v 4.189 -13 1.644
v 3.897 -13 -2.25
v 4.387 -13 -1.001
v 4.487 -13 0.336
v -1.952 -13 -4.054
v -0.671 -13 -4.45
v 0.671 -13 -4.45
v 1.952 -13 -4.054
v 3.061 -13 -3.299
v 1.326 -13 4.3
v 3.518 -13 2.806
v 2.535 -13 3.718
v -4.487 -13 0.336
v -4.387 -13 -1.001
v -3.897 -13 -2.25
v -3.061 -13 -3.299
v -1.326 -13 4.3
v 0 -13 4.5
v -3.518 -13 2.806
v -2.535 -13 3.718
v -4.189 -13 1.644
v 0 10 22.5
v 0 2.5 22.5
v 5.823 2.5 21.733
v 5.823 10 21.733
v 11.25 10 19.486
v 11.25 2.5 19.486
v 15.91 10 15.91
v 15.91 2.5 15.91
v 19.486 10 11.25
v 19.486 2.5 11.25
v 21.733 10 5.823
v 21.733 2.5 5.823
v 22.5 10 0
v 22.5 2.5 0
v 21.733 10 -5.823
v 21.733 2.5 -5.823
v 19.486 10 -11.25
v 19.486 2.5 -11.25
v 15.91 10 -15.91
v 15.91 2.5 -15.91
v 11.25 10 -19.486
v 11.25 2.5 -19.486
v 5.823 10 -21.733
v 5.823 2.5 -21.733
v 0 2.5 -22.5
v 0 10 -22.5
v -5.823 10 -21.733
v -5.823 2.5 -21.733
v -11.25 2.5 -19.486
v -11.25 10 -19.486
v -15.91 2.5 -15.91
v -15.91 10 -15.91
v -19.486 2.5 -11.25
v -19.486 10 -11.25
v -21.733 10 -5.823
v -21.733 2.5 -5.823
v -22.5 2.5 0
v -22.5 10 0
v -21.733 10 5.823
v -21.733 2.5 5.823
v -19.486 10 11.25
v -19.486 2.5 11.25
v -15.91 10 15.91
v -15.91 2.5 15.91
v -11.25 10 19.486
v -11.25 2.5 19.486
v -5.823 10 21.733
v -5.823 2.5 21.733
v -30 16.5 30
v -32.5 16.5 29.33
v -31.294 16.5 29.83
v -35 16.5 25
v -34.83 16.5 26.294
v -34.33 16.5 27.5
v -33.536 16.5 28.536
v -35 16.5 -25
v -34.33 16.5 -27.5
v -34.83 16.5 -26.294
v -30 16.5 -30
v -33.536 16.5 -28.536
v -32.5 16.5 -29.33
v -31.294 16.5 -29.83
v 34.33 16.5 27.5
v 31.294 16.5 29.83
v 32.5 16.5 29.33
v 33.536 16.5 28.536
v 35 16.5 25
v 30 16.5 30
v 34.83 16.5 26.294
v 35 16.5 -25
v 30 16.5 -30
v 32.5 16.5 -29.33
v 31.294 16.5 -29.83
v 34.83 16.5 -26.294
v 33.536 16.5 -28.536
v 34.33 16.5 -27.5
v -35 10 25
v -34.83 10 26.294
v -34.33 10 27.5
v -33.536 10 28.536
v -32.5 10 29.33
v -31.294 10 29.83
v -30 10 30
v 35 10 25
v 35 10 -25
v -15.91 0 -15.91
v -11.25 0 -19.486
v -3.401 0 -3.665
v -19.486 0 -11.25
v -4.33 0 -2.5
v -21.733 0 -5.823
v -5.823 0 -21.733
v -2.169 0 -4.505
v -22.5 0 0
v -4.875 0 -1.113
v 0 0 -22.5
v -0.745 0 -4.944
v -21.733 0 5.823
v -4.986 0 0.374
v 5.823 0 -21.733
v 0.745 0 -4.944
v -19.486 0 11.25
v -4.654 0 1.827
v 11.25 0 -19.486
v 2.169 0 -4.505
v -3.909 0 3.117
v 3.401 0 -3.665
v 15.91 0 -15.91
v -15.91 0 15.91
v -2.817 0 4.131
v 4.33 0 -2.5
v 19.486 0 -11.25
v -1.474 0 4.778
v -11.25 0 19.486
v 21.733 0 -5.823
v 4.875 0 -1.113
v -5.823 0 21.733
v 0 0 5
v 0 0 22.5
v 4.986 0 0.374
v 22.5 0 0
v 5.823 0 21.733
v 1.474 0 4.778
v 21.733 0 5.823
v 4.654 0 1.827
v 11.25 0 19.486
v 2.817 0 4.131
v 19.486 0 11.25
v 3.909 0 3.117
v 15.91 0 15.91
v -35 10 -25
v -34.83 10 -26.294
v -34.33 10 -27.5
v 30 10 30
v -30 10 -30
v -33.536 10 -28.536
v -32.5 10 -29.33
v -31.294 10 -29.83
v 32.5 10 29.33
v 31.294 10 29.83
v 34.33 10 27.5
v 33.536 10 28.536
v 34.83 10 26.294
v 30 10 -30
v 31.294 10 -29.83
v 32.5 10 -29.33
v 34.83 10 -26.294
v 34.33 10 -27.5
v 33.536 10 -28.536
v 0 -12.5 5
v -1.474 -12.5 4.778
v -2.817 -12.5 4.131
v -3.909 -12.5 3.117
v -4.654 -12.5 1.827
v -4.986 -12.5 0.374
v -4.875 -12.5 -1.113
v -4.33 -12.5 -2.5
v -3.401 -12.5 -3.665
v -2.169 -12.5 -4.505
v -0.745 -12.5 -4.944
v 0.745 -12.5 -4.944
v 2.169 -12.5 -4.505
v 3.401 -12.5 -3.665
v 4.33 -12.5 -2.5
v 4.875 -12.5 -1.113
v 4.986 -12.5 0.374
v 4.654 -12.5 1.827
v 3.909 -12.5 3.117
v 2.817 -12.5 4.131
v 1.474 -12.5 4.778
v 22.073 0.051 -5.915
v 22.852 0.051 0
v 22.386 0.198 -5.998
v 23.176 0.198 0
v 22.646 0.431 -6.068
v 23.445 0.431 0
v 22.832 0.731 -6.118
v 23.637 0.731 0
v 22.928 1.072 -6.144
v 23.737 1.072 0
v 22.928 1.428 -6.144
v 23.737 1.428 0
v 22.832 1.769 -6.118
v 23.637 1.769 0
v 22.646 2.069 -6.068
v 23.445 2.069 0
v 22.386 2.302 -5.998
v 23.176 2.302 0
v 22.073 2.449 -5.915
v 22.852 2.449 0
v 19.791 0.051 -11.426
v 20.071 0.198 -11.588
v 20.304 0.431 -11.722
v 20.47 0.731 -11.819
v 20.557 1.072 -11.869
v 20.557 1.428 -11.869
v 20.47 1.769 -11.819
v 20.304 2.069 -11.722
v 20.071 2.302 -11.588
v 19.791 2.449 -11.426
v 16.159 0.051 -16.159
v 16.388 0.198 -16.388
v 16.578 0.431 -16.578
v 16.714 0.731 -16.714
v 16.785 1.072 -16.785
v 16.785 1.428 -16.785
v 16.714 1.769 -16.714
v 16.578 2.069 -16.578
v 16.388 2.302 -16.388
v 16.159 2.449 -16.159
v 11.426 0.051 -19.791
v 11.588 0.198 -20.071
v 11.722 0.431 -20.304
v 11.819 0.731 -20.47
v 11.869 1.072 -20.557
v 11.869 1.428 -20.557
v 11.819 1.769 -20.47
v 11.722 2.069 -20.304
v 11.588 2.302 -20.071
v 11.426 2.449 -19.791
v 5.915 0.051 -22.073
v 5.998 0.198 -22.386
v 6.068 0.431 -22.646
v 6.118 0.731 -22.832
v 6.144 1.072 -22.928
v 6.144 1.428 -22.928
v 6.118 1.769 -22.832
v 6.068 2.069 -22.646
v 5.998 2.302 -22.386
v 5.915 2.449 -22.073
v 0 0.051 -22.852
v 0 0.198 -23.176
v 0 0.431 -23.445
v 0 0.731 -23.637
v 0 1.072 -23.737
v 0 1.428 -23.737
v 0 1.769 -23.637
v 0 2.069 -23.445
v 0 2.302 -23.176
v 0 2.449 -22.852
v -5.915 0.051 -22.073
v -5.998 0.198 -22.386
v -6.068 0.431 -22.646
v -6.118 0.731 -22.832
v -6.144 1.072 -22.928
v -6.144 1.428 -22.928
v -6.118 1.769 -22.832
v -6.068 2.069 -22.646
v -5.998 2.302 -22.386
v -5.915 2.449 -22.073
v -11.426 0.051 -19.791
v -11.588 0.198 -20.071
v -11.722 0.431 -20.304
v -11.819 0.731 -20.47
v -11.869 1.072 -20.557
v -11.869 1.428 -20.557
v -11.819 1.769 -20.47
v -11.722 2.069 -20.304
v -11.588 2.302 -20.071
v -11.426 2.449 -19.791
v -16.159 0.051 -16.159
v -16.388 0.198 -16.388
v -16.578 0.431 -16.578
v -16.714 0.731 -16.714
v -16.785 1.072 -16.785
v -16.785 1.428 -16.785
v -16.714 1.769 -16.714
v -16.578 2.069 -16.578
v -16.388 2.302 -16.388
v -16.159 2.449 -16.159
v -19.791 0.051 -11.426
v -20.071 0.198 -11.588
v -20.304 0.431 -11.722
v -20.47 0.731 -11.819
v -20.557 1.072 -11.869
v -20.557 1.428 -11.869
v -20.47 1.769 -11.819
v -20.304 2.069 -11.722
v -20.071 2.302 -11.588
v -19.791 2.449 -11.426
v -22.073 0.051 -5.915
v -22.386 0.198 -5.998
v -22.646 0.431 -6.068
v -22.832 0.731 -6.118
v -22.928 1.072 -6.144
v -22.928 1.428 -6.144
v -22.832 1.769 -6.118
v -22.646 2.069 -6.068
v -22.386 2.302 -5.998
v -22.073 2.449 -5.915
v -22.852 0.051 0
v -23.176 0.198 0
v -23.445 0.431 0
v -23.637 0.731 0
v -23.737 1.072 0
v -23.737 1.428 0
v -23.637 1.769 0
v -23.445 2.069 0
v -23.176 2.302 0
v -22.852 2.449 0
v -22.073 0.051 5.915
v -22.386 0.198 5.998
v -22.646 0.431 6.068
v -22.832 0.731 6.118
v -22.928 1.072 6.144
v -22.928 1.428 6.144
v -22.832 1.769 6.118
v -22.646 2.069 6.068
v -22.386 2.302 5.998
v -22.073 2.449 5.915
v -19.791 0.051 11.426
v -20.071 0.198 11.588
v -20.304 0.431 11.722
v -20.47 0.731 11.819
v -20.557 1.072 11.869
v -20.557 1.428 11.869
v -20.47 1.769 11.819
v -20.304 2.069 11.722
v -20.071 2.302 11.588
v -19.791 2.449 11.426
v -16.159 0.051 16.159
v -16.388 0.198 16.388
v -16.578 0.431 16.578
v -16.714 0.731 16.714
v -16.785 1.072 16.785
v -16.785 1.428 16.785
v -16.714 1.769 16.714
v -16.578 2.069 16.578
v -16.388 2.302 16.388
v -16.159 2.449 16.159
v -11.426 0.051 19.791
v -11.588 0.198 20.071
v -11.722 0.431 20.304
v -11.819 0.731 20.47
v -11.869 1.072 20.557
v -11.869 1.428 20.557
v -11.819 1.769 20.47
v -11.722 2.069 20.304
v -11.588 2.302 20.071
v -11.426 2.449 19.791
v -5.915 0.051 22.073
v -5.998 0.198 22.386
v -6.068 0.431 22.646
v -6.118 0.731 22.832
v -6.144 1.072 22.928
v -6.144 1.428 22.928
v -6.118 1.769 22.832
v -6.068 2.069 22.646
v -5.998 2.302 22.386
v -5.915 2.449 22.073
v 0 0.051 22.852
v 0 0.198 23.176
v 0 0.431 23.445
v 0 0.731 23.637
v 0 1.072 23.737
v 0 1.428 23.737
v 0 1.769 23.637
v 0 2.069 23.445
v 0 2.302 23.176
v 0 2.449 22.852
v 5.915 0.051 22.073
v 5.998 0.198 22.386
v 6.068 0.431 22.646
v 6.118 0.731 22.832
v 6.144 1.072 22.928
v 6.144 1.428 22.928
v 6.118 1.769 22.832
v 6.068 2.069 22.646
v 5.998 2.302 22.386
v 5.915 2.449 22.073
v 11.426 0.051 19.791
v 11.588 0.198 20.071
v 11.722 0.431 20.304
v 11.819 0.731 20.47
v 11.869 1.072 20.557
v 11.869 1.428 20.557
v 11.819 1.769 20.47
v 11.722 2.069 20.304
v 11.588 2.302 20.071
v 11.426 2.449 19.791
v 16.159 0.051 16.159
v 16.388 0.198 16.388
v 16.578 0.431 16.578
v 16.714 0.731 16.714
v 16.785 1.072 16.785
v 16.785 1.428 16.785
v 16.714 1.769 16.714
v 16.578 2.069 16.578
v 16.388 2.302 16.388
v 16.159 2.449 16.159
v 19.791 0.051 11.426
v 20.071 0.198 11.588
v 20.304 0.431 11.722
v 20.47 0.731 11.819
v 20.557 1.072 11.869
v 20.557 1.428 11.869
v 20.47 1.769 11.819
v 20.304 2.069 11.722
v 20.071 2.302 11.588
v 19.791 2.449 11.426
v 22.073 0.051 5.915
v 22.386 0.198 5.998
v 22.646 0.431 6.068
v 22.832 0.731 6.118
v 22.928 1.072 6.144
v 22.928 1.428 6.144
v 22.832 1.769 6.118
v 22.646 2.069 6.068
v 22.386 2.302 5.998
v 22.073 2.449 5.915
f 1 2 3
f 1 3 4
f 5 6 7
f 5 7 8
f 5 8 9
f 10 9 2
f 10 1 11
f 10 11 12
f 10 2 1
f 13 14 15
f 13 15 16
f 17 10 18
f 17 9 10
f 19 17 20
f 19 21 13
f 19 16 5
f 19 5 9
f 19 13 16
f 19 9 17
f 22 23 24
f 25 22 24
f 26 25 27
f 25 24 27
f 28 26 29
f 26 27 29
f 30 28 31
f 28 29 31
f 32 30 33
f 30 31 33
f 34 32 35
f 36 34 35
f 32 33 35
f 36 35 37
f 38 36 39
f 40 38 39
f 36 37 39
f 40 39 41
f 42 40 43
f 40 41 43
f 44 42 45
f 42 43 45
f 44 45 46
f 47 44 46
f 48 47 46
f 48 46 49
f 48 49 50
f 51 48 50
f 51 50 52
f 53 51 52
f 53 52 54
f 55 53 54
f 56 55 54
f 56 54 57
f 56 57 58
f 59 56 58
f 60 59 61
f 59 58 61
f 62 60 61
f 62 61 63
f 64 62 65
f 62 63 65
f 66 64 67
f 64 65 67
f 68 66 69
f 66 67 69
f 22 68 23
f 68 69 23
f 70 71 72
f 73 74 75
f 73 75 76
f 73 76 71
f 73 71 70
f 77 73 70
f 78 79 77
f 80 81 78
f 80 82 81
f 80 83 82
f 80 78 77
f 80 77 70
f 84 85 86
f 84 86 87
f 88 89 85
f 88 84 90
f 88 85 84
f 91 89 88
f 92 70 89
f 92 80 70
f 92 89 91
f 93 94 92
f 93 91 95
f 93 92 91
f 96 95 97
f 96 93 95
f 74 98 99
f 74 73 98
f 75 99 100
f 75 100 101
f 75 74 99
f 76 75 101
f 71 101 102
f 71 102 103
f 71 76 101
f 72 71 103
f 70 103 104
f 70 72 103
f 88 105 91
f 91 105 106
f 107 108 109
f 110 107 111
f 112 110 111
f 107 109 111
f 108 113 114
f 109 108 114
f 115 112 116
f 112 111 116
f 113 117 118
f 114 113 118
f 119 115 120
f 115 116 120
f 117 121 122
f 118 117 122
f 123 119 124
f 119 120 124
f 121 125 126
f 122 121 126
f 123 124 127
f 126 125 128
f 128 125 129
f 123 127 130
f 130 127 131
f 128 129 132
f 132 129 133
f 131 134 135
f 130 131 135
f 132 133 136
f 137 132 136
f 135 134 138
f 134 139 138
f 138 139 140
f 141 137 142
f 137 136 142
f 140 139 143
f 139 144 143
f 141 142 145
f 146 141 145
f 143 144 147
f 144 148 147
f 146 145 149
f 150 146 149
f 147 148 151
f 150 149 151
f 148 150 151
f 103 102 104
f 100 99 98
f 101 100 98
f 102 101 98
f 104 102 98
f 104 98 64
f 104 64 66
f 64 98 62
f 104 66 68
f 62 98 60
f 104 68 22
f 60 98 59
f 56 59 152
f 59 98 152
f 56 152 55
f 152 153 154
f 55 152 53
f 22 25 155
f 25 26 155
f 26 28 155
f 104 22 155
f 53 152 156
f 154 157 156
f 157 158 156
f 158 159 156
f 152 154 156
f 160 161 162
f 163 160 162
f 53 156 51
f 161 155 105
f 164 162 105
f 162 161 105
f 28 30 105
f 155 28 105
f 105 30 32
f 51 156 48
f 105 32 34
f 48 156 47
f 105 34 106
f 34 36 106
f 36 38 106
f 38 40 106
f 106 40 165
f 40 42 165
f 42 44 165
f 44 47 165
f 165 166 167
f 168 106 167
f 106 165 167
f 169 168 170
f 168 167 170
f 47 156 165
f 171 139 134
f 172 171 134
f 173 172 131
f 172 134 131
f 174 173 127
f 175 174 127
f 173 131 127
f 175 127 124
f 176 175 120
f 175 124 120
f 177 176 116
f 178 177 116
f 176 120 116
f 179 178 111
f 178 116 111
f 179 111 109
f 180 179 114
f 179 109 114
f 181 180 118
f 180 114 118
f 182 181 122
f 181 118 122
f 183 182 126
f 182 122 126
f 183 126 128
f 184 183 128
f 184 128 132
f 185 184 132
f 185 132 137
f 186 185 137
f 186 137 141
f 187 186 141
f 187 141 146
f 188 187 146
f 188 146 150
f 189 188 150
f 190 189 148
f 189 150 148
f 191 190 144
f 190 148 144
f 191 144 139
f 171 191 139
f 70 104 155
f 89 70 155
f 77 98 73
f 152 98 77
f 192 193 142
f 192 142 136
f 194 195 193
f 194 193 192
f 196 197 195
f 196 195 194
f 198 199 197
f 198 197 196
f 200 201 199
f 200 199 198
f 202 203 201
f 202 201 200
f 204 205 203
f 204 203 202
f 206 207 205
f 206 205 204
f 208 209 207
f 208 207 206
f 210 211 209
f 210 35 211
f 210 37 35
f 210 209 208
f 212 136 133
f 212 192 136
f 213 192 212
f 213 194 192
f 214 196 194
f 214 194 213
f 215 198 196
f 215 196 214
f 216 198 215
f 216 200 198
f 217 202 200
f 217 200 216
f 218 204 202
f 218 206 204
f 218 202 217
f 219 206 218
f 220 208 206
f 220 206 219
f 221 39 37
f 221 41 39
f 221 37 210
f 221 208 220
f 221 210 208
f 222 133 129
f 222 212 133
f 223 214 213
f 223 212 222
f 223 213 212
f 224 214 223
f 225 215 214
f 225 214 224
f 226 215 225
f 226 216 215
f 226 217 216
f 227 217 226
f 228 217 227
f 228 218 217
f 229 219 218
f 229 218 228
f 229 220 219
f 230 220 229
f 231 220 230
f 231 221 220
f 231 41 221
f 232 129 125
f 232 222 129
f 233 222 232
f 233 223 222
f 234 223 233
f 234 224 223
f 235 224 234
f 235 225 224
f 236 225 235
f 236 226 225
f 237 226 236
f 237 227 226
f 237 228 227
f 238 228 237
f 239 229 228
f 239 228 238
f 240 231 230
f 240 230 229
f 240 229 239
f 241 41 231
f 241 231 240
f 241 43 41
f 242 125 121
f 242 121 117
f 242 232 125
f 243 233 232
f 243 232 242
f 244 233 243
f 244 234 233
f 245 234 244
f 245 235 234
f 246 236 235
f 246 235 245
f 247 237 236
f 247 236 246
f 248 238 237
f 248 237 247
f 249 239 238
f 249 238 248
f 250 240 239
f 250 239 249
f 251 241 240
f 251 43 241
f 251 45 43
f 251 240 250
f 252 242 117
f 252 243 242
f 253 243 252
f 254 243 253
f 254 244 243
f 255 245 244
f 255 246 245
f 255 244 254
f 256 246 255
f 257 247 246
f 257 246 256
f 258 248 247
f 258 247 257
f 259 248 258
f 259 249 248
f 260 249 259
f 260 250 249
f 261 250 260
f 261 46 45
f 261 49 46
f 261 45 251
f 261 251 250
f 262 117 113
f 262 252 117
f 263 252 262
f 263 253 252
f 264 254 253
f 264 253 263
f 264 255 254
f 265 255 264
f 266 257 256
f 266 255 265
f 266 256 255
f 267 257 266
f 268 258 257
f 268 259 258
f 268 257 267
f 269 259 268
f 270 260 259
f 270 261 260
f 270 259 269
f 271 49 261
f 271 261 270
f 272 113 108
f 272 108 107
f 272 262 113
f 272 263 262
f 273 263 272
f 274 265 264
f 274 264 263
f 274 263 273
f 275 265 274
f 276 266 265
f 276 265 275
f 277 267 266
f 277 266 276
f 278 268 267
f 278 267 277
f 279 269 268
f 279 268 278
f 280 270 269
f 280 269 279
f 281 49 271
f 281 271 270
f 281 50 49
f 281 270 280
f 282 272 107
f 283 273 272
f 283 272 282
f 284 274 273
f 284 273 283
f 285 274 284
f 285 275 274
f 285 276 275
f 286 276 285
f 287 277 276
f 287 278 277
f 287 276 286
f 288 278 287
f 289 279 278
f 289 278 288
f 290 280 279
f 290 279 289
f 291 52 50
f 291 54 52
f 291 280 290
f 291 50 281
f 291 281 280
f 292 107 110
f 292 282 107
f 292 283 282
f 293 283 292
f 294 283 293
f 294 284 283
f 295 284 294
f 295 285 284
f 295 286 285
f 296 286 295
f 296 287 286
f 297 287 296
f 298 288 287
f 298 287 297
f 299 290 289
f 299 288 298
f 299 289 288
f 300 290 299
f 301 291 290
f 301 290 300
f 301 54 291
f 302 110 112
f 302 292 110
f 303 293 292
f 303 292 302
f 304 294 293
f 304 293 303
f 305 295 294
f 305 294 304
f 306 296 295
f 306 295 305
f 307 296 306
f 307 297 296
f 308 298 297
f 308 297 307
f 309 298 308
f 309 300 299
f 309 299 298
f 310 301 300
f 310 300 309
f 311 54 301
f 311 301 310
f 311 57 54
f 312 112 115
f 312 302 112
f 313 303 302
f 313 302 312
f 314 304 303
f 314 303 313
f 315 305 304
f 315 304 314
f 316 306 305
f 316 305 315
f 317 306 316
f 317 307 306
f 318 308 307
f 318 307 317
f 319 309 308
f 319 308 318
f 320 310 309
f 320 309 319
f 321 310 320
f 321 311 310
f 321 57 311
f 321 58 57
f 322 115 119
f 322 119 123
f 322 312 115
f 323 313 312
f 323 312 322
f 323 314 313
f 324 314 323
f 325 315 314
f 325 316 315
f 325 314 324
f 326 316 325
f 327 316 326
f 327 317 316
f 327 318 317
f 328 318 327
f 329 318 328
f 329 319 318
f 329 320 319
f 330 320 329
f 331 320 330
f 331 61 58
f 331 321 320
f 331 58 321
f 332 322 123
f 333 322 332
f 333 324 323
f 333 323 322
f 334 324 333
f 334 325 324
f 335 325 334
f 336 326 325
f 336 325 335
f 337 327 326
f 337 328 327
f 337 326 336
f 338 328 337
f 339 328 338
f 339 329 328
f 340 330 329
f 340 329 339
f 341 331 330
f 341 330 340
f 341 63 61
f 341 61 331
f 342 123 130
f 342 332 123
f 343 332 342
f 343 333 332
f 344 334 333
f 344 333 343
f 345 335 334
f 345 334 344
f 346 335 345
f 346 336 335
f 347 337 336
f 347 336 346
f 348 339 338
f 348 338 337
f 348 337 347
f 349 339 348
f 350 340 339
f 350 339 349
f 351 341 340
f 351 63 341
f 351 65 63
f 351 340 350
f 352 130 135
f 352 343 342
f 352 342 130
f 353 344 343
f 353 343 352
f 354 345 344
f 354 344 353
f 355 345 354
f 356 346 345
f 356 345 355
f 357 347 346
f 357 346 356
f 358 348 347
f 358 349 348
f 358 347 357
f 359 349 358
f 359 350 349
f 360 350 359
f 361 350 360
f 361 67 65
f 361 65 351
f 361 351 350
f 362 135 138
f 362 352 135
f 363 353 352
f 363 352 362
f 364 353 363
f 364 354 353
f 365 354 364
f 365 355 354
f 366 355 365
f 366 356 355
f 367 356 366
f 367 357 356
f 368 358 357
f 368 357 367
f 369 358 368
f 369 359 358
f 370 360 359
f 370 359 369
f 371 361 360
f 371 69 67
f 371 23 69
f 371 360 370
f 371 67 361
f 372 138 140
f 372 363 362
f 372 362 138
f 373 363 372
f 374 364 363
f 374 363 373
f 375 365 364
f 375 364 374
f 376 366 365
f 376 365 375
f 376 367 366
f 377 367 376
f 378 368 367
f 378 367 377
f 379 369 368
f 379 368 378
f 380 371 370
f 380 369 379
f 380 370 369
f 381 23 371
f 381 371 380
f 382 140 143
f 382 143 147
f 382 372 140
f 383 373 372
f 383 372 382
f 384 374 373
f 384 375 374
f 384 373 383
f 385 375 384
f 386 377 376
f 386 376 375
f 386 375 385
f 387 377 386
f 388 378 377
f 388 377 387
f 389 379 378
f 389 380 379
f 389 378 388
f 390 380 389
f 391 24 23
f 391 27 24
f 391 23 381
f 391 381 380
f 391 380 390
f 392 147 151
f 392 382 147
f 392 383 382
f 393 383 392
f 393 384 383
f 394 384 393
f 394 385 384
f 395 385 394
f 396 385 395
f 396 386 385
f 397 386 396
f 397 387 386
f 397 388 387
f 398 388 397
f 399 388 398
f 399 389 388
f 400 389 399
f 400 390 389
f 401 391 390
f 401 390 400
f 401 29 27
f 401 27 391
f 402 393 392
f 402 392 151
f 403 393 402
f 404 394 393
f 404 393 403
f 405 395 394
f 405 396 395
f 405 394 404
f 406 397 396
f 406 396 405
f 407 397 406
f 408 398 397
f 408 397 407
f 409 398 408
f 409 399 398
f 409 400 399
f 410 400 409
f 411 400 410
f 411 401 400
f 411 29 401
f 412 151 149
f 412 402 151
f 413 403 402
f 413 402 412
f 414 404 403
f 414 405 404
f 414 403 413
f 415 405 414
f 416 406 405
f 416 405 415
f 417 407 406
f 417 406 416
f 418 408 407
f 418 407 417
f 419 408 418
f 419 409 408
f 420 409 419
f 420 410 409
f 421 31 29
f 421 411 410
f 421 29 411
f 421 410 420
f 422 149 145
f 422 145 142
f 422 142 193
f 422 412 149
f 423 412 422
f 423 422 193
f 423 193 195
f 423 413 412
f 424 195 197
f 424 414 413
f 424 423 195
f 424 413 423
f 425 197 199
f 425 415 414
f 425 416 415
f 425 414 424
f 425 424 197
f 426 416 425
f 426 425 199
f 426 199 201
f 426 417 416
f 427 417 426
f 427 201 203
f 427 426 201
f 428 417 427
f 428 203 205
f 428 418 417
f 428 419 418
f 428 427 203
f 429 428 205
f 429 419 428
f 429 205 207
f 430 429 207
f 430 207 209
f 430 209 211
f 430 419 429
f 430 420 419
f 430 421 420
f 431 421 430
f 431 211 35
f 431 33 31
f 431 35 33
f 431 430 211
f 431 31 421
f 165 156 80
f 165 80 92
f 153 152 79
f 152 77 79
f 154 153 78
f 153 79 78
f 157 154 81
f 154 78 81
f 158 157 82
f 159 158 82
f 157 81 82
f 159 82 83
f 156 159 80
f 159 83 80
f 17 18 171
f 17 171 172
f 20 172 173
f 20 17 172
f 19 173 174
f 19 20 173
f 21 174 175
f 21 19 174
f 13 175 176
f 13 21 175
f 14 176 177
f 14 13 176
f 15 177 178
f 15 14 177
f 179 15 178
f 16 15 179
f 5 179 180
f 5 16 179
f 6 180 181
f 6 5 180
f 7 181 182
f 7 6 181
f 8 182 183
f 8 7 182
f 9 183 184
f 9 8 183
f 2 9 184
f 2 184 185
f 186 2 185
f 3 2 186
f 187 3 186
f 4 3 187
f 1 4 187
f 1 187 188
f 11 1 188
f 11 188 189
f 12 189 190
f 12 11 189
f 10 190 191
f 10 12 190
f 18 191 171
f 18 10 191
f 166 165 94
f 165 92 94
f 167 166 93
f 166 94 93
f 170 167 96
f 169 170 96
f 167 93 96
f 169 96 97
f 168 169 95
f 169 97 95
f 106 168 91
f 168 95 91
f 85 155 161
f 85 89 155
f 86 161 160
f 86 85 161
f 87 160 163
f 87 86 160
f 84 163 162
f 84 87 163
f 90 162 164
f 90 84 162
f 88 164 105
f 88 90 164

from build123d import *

# Parameters (mm, degrees)
ESBO_O1_R                = 22.5
RESSALTO_EXTRUS_O1_DEPTH = 10
ESBO_O3_W                = 70
ESBO_O3_H                = 60
RESSALTO_EXTRUS_O2_DEPTH = 6.5
ESBO_O5_R                = 5
RESSALTO_EXTRUS_O3_DEPTH = 13
CHANFRO1_SIZE            = 0.5
FILETE1_R                = 5


# Read off the part's stored shape, not the designer's step: Varredura1
with BuildPart() as part:
    # Esboço1 → Ressalto-extrusão1 (new body)
    with BuildSketch(Plane(origin=(0, 0, 0), x_dir=(1, 0, 0), z_dir=(0, 1, 0))):
        with Locations(Location((0, 0, 0), (0, 0, 270))):
            Circle(ESBO_O1_R)
    extrude(amount=RESSALTO_EXTRUS_O1_DEPTH)

    # Esboço3 → Ressalto-extrusão2 (add)
    with BuildSketch(Plane(origin=(0, 10, 0), x_dir=(1, 0, 0), z_dir=(0, 1, 0))):
        Rectangle(ESBO_O3_W, ESBO_O3_H)
    extrude(amount=RESSALTO_EXTRUS_O2_DEPTH)

    # Varredura1 outline → Varredura1 (revolve)
    with BuildSketch(Plane.XY):
        with BuildLine():
            Line((22.5, 2.5), (22.5, 0))
            ThreePointArc((22.5, 0), (23.75, 1.25), (22.5, 2.5))
        make_face()
    revolve(axis=Axis((0, 0, 0), (0, 1, 0)))

    # Esboço5 → Ressalto-extrusão3 (add)
    with BuildSketch(Plane.XZ):
        with Locations(Location((0, 0, 0), (0, 0, 90))):
            Circle(ESBO_O5_R)
    extrude(amount=RESSALTO_EXTRUS_O3_DEPTH)

    # Chanfro1
    chanfro1_edges = [part.edges().sort_by_distance(p)[0] for p in [
        (0, -13, -5),
    ]]
    chamfer(chanfro1_edges, length=CHANFRO1_SIZE)

    # Filete1
    filete1_edges = [part.edges().sort_by_distance(p)[0] for p in [
        (35, 13.25, 30),
        (35, 13.25, -30),
        (-35, 13.25, -30),
        (-35, 13.25, 30),
    ]]
    fillet(filete1_edges, radius=FILETE1_R)


solid = part.part
